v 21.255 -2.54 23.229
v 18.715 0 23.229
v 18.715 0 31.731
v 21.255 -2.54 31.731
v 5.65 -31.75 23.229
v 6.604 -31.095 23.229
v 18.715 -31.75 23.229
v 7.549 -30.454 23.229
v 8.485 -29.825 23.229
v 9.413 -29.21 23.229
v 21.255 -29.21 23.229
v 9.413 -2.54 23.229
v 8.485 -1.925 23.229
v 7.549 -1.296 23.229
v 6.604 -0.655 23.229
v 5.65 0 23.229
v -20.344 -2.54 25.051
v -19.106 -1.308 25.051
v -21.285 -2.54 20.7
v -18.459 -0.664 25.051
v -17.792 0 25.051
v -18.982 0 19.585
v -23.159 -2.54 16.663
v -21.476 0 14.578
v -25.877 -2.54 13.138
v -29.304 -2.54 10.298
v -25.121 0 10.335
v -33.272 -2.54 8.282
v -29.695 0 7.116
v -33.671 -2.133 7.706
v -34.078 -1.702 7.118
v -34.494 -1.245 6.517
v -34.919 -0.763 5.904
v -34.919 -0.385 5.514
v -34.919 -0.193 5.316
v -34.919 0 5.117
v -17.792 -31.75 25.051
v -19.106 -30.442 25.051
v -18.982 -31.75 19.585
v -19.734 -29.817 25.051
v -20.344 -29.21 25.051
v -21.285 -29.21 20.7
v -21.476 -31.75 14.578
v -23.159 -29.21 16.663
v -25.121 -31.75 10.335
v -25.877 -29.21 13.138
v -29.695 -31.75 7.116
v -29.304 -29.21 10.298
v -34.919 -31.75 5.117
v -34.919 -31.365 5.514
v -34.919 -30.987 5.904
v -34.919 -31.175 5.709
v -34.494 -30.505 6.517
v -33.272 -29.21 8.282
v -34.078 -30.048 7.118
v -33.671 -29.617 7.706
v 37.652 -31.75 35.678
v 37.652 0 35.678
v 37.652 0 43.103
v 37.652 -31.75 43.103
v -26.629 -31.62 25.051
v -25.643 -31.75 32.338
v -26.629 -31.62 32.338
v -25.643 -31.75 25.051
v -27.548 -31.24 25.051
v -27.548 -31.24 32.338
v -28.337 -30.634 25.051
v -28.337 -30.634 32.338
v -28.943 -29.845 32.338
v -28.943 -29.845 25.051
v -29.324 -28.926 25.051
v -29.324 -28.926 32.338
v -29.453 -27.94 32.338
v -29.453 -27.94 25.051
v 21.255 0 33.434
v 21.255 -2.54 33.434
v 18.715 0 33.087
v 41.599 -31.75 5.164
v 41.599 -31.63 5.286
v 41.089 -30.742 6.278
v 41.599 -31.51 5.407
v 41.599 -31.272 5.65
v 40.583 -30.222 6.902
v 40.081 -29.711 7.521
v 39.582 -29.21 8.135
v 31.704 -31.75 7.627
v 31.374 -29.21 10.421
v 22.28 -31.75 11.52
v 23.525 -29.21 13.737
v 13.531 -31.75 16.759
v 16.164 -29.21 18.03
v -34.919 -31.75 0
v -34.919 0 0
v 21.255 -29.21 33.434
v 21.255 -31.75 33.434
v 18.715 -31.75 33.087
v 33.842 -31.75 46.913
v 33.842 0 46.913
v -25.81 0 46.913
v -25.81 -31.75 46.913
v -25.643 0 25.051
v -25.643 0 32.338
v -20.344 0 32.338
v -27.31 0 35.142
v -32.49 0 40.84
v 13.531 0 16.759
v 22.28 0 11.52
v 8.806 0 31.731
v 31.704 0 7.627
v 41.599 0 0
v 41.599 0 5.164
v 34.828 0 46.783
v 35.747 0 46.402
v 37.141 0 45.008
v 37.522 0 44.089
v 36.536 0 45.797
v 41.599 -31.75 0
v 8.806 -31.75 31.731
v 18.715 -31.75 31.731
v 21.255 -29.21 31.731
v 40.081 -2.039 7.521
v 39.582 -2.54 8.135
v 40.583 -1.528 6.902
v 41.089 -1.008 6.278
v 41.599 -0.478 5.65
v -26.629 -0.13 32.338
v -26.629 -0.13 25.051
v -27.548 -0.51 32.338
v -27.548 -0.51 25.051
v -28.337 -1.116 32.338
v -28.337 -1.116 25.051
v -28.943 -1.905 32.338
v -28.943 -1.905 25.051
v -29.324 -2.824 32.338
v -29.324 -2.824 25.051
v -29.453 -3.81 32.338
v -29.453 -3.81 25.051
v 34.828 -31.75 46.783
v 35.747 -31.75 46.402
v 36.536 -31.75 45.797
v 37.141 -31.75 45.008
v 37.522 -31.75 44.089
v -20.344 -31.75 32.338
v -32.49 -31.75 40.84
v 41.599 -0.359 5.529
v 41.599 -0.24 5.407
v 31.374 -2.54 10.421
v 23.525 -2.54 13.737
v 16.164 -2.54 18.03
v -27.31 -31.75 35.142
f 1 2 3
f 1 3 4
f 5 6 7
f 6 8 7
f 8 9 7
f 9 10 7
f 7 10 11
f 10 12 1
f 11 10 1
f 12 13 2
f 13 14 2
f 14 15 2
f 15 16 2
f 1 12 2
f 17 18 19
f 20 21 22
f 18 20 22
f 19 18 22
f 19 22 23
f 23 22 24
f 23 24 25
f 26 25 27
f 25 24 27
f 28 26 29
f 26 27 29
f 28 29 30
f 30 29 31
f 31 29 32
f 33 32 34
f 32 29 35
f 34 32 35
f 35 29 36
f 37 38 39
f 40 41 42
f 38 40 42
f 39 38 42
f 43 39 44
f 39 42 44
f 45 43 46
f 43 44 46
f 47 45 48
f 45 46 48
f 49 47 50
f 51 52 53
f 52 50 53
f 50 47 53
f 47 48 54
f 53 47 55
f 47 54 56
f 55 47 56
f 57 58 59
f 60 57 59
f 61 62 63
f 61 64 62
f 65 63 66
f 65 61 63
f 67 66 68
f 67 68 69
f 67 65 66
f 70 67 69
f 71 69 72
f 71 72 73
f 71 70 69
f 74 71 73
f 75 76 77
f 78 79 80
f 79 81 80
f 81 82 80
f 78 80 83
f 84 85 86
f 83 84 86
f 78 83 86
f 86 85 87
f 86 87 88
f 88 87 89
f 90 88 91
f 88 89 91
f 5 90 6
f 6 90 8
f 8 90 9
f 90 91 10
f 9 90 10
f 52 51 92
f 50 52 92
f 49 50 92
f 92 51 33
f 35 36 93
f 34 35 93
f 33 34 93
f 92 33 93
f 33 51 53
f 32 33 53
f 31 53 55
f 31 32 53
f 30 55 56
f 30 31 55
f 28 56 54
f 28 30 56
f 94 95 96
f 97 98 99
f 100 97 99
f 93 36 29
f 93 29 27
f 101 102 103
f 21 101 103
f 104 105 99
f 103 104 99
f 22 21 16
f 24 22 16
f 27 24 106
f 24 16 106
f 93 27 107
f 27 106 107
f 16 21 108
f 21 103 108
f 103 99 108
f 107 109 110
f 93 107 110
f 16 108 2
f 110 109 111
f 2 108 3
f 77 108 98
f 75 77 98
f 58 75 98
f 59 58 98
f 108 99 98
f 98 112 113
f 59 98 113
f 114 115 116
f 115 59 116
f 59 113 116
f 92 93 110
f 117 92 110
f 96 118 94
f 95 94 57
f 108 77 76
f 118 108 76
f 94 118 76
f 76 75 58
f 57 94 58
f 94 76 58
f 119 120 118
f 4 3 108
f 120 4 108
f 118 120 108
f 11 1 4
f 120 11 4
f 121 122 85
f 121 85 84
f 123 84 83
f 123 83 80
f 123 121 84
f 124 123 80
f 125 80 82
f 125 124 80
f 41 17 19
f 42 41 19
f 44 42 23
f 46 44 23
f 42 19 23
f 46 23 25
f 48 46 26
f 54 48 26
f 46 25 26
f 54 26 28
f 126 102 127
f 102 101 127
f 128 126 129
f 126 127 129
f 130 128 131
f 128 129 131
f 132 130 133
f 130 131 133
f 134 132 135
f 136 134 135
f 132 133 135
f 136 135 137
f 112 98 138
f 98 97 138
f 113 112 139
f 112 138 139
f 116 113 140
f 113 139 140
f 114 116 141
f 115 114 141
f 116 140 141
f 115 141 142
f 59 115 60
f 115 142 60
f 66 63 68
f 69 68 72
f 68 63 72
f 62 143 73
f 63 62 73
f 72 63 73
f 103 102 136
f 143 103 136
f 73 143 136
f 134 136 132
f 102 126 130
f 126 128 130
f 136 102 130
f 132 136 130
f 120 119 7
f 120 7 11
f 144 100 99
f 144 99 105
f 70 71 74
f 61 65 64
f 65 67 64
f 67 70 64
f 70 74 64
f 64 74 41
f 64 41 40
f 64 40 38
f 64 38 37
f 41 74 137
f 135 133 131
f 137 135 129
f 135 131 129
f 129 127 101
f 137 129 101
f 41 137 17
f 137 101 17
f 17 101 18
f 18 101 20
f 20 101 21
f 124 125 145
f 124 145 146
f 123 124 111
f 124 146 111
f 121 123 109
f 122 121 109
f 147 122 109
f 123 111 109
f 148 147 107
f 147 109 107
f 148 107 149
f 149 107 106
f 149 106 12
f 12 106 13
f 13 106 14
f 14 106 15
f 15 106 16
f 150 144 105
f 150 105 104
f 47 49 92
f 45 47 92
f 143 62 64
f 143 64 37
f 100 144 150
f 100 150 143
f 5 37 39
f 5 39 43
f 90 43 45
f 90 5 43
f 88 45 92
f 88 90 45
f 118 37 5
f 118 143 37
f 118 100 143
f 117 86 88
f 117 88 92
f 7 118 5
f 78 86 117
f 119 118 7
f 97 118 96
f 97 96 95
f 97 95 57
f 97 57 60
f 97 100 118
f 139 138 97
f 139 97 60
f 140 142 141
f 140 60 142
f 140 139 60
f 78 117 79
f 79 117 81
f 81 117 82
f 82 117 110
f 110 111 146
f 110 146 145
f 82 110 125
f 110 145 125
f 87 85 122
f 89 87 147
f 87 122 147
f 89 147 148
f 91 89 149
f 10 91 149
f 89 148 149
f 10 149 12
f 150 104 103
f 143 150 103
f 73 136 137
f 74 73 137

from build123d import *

# Parameters (mm, degrees)
F1_DEPTH     = 31.75
F2_T1_DEPTH  = 42.6160723951
F2_T3_DEPTH  = 41.3681408406
F2_T8_ANGLE  = 42.4045514756
F2_T13_ANGLE = 42.4045514756
F2_T18_ANGLE = 105.7775701063
F2_T23_ANGLE = 105.7775701063
F2_T28_DEPTH = 21.5661635602
F2_T33_DEPTH = 21.5661635602
F3_R         = 3.81


# Not quite as in the source:
# - a fillet or chamfer that OpenCascade refuses, or shapes differently, is made with other operations: its cross-section is extruded or revolved along the edge and cut away or added


with BuildPart() as f1:
    # F0 (on Front) → F1 (new body)
    with BuildSketch(Plane.XZ):
        with BuildLine():
            Line((-34.918975085, 0), (0, 0))
            Line((0, 0), (41.5991283953, 0))
            Line((41.5991283953, 0), (41.5991283953, 7.7429031953))
            ThreePointArc((41.5991283953, 7.7429031953), (24.4471014125, 13.2848832085), (9.4129433855, 23.2287086546))
            Line((9.4129433855, 23.2287086546), (21.2550275028, 23.2287086546))
            Line((21.2550275028, 23.2287086546), (21.2550275028, 31.730722636))
            Line((21.2550275028, 31.730722636), (8.8056568056, 31.730722636))
            Line((8.8056568056, 31.730722636), (37.6517660916, 35.6780849397))
            Line((37.6517660916, 35.6780849397), (37.6517660916, 46.912882477))
            Line((37.6517660916, 46.912882477), (-25.8096773177, 46.912882477))
            Line((-25.8096773177, 46.912882477), (-32.4898287654, 40.8400185406))
            Line((-32.4898287654, 40.8400185406), (-27.3100329334, 35.1422421722))
            Line((-27.3100329334, 35.1422421722), (-20.3440990299, 32.3380082846))
            Line((-20.3440990299, 32.3380082846), (-29.4533986598, 32.3380082846))
            Line((-29.4533986598, 32.3380082846), (-29.4533986598, 25.0505693257))
            Line((-29.4533986598, 25.0505693257), (-20.3440990299, 25.0505693257))
            ThreePointArc((-20.3440990299, 25.0505693257), (-24.9642185282, 14.1505733942), (-34.918975085, 7.7429031953))
            Line((-34.918975085, 7.7429031953), (-34.918975085, 0))
        make_face()
    extrude(amount=F1_DEPTH)

    # F2: chamfer of 2.54 on 8 edges, made by hand

    # F2_s2 → F2_t1 (cut)
    with BuildSketch(Plane.XZ.offset(-5.4330361975)):
        with BuildLine():
            Line((39.5823851634, 8.1350460371), (41.5991283953, 5.6495275088))
            Line((41.5991283953, 5.6495275088), (41.5991283953, 7.7429031953))
            ThreePointArc((41.5991283953, 7.7429031953), (40.55098868, 7.9386371476), (39.5823851634, 8.1350460371))
        make_face()
    extrude(amount=F2_T1_DEPTH, mode=Mode.SUBTRACT)

    # F2_s4 → F2_t3 (cut)
    with BuildSketch(Plane.XZ.offset(-4.8090704203)):
        with BuildLine():
            Line((-34.918975085, 5.9036651076), (-33.2718375789, 8.2815626174))
            ThreePointArc((-33.2718375789, 8.2815626174), (-34.0510462722, 8.0071201362), (-34.918975085, 7.7429031953))
            Line((-34.918975085, 7.7429031953), (-34.918975085, 5.9036651076))
        make_face()
    extrude(amount=F2_T3_DEPTH, mode=Mode.SUBTRACT)


with BuildPart() as f2_tool6:
    # F2_s7 → F2_t8 (revolve)
    with BuildSketch(Plane(origin=(47.2414051796, 0, -3.7108637316), x_dir=(0, 1, 0), z_dir=(0.9969290674, 0, -0.078309862))):
        Polygon((-31.75, 8.1162253666), (-29.21, 10.6562253666), (-31.75, 10.6562253666), align=None)
    revolve(axis=Axis((53.2845253443, -31.75, 73.221491886), (0, 1, 0)), revolution_arc=F2_T8_ANGLE)

    split(bisect_by=Plane.XY.offset(23.2287086546), keep=Keep.BOTTOM)


with BuildPart() as f1_1:
    add(f1.part)

    # F2_t5: cut F2_tool6
    add(f2_tool6.part, mode=Mode.SUBTRACT)


with BuildPart() as f2_tool11:
    # F2_s12 → F2_t13 (revolve)
    with BuildSketch(Plane(origin=(47.2414051796, 0, -3.7108637316), x_dir=(0, 1, 0), z_dir=(0.9969290674, 0, -0.078309862))):
        Polygon((-2.54, 10.6562253666), (0, 8.1162253666), (0, 10.6562253666), align=None)
    revolve(axis=Axis((53.2845253443, 0, 73.221491886), (0, 1, 0)), revolution_arc=F2_T13_ANGLE)

    split(bisect_by=Plane.XY.offset(23.2287086546), keep=Keep.BOTTOM)


with BuildPart() as f1_2:
    add(f1_1.part)

    # F2_t10: cut F2_tool11
    add(f2_tool11.part, mode=Mode.SUBTRACT)


with BuildPart() as f2_tool16:
    # F2_s17 → F2_t18 (revolve)
    with BuildSketch(Plane(origin=(-7.8247411196, 0, 34.4744832645), x_dir=(0, 1, 0), z_dir=(-0.2213421957, 0, 0.975196202))):
        Polygon((-31.75, 10.7019792675), (-29.21, 13.2419792675), (-31.75, 13.2419792675), align=None)
    revolve(axis=Axis((-40.3361011805, -31.75, 27.0953160709), (0, 1, 0)), revolution_arc=F2_T18_ANGLE)

    split(bisect_by=Plane.XY.offset(25.0505693257), keep=Keep.BOTTOM)


with BuildPart() as f1_3:
    add(f1_2.part)

    # F2_t15: cut F2_tool16
    add(f2_tool16.part, mode=Mode.SUBTRACT)


with BuildPart() as f2_tool21:
    # F2_s22 → F2_t23 (revolve)
    with BuildSketch(Plane(origin=(-7.8247411196, 0, 34.4744832645), x_dir=(0, 1, 0), z_dir=(-0.2213421957, 0, 0.975196202))):
        Polygon((-2.54, 13.2419792675), (0, 10.7019792675), (0, 13.2419792675), align=None)
    revolve(axis=Axis((-40.3361011805, 0, 27.0953160709), (0, 1, 0)), revolution_arc=F2_T23_ANGLE)

    split(bisect_by=Plane.XY.offset(25.0505693257), keep=Keep.BOTTOM)


with BuildPart() as f1_4:
    add(f1_3.part)

    # F2_t20: cut F2_tool21
    add(f2_tool21.part, mode=Mode.SUBTRACT)


with BuildPart() as f2_tool26:
    # F2_s27 → F2_t28 (new body)
    with BuildSketch(Plane.XY.offset(16.6966338652)):
        Polygon((18.7150275028, 0), (21.2550275028, -2.54), (21.2550275028, 0), align=None)
    extrude(amount=F2_T28_DEPTH)

    split(bisect_by=Plane(origin=(-4.1004226977, 0, 29.9646275548), x_dir=(0, 1, 0), z_dir=(0.1355785861, 0, -0.9907665956)), keep=Keep.TOP)


with BuildPart() as f1_5:
    add(f1_4.part)

    # F2_t25: cut F2_tool26
    add(f2_tool26.part, mode=Mode.SUBTRACT)


with BuildPart() as f2_tool31:
    # F2_s32 → F2_t33 (new body)
    with BuildSketch(Plane.XY.offset(16.6966338652)):
        Polygon((18.7150275028, -31.75), (21.2550275028, -29.21), (21.2550275028, -31.75), align=None)
    extrude(amount=F2_T33_DEPTH)

    split(bisect_by=Plane(origin=(-4.1004226977, 0, 29.9646275548), x_dir=(0, 1, 0), z_dir=(0.1355785861, 0, -0.9907665956)), keep=Keep.TOP)


with BuildPart() as f1_6:
    add(f1_5.part)

    # F2_t30: cut F2_tool31
    add(f2_tool31.part, mode=Mode.SUBTRACT)

    # F3
    f3_edges = [f1_6.edges().sort_by_distance(p)[0] for p in [
        (-29.453399, -31.75, 28.694289),
        (-29.453399, 0, 28.694289),
        (37.651766, -15.875, 46.912882),
    ]]
    fillet(f3_edges, radius=F3_R)


solid = f1_6.part
